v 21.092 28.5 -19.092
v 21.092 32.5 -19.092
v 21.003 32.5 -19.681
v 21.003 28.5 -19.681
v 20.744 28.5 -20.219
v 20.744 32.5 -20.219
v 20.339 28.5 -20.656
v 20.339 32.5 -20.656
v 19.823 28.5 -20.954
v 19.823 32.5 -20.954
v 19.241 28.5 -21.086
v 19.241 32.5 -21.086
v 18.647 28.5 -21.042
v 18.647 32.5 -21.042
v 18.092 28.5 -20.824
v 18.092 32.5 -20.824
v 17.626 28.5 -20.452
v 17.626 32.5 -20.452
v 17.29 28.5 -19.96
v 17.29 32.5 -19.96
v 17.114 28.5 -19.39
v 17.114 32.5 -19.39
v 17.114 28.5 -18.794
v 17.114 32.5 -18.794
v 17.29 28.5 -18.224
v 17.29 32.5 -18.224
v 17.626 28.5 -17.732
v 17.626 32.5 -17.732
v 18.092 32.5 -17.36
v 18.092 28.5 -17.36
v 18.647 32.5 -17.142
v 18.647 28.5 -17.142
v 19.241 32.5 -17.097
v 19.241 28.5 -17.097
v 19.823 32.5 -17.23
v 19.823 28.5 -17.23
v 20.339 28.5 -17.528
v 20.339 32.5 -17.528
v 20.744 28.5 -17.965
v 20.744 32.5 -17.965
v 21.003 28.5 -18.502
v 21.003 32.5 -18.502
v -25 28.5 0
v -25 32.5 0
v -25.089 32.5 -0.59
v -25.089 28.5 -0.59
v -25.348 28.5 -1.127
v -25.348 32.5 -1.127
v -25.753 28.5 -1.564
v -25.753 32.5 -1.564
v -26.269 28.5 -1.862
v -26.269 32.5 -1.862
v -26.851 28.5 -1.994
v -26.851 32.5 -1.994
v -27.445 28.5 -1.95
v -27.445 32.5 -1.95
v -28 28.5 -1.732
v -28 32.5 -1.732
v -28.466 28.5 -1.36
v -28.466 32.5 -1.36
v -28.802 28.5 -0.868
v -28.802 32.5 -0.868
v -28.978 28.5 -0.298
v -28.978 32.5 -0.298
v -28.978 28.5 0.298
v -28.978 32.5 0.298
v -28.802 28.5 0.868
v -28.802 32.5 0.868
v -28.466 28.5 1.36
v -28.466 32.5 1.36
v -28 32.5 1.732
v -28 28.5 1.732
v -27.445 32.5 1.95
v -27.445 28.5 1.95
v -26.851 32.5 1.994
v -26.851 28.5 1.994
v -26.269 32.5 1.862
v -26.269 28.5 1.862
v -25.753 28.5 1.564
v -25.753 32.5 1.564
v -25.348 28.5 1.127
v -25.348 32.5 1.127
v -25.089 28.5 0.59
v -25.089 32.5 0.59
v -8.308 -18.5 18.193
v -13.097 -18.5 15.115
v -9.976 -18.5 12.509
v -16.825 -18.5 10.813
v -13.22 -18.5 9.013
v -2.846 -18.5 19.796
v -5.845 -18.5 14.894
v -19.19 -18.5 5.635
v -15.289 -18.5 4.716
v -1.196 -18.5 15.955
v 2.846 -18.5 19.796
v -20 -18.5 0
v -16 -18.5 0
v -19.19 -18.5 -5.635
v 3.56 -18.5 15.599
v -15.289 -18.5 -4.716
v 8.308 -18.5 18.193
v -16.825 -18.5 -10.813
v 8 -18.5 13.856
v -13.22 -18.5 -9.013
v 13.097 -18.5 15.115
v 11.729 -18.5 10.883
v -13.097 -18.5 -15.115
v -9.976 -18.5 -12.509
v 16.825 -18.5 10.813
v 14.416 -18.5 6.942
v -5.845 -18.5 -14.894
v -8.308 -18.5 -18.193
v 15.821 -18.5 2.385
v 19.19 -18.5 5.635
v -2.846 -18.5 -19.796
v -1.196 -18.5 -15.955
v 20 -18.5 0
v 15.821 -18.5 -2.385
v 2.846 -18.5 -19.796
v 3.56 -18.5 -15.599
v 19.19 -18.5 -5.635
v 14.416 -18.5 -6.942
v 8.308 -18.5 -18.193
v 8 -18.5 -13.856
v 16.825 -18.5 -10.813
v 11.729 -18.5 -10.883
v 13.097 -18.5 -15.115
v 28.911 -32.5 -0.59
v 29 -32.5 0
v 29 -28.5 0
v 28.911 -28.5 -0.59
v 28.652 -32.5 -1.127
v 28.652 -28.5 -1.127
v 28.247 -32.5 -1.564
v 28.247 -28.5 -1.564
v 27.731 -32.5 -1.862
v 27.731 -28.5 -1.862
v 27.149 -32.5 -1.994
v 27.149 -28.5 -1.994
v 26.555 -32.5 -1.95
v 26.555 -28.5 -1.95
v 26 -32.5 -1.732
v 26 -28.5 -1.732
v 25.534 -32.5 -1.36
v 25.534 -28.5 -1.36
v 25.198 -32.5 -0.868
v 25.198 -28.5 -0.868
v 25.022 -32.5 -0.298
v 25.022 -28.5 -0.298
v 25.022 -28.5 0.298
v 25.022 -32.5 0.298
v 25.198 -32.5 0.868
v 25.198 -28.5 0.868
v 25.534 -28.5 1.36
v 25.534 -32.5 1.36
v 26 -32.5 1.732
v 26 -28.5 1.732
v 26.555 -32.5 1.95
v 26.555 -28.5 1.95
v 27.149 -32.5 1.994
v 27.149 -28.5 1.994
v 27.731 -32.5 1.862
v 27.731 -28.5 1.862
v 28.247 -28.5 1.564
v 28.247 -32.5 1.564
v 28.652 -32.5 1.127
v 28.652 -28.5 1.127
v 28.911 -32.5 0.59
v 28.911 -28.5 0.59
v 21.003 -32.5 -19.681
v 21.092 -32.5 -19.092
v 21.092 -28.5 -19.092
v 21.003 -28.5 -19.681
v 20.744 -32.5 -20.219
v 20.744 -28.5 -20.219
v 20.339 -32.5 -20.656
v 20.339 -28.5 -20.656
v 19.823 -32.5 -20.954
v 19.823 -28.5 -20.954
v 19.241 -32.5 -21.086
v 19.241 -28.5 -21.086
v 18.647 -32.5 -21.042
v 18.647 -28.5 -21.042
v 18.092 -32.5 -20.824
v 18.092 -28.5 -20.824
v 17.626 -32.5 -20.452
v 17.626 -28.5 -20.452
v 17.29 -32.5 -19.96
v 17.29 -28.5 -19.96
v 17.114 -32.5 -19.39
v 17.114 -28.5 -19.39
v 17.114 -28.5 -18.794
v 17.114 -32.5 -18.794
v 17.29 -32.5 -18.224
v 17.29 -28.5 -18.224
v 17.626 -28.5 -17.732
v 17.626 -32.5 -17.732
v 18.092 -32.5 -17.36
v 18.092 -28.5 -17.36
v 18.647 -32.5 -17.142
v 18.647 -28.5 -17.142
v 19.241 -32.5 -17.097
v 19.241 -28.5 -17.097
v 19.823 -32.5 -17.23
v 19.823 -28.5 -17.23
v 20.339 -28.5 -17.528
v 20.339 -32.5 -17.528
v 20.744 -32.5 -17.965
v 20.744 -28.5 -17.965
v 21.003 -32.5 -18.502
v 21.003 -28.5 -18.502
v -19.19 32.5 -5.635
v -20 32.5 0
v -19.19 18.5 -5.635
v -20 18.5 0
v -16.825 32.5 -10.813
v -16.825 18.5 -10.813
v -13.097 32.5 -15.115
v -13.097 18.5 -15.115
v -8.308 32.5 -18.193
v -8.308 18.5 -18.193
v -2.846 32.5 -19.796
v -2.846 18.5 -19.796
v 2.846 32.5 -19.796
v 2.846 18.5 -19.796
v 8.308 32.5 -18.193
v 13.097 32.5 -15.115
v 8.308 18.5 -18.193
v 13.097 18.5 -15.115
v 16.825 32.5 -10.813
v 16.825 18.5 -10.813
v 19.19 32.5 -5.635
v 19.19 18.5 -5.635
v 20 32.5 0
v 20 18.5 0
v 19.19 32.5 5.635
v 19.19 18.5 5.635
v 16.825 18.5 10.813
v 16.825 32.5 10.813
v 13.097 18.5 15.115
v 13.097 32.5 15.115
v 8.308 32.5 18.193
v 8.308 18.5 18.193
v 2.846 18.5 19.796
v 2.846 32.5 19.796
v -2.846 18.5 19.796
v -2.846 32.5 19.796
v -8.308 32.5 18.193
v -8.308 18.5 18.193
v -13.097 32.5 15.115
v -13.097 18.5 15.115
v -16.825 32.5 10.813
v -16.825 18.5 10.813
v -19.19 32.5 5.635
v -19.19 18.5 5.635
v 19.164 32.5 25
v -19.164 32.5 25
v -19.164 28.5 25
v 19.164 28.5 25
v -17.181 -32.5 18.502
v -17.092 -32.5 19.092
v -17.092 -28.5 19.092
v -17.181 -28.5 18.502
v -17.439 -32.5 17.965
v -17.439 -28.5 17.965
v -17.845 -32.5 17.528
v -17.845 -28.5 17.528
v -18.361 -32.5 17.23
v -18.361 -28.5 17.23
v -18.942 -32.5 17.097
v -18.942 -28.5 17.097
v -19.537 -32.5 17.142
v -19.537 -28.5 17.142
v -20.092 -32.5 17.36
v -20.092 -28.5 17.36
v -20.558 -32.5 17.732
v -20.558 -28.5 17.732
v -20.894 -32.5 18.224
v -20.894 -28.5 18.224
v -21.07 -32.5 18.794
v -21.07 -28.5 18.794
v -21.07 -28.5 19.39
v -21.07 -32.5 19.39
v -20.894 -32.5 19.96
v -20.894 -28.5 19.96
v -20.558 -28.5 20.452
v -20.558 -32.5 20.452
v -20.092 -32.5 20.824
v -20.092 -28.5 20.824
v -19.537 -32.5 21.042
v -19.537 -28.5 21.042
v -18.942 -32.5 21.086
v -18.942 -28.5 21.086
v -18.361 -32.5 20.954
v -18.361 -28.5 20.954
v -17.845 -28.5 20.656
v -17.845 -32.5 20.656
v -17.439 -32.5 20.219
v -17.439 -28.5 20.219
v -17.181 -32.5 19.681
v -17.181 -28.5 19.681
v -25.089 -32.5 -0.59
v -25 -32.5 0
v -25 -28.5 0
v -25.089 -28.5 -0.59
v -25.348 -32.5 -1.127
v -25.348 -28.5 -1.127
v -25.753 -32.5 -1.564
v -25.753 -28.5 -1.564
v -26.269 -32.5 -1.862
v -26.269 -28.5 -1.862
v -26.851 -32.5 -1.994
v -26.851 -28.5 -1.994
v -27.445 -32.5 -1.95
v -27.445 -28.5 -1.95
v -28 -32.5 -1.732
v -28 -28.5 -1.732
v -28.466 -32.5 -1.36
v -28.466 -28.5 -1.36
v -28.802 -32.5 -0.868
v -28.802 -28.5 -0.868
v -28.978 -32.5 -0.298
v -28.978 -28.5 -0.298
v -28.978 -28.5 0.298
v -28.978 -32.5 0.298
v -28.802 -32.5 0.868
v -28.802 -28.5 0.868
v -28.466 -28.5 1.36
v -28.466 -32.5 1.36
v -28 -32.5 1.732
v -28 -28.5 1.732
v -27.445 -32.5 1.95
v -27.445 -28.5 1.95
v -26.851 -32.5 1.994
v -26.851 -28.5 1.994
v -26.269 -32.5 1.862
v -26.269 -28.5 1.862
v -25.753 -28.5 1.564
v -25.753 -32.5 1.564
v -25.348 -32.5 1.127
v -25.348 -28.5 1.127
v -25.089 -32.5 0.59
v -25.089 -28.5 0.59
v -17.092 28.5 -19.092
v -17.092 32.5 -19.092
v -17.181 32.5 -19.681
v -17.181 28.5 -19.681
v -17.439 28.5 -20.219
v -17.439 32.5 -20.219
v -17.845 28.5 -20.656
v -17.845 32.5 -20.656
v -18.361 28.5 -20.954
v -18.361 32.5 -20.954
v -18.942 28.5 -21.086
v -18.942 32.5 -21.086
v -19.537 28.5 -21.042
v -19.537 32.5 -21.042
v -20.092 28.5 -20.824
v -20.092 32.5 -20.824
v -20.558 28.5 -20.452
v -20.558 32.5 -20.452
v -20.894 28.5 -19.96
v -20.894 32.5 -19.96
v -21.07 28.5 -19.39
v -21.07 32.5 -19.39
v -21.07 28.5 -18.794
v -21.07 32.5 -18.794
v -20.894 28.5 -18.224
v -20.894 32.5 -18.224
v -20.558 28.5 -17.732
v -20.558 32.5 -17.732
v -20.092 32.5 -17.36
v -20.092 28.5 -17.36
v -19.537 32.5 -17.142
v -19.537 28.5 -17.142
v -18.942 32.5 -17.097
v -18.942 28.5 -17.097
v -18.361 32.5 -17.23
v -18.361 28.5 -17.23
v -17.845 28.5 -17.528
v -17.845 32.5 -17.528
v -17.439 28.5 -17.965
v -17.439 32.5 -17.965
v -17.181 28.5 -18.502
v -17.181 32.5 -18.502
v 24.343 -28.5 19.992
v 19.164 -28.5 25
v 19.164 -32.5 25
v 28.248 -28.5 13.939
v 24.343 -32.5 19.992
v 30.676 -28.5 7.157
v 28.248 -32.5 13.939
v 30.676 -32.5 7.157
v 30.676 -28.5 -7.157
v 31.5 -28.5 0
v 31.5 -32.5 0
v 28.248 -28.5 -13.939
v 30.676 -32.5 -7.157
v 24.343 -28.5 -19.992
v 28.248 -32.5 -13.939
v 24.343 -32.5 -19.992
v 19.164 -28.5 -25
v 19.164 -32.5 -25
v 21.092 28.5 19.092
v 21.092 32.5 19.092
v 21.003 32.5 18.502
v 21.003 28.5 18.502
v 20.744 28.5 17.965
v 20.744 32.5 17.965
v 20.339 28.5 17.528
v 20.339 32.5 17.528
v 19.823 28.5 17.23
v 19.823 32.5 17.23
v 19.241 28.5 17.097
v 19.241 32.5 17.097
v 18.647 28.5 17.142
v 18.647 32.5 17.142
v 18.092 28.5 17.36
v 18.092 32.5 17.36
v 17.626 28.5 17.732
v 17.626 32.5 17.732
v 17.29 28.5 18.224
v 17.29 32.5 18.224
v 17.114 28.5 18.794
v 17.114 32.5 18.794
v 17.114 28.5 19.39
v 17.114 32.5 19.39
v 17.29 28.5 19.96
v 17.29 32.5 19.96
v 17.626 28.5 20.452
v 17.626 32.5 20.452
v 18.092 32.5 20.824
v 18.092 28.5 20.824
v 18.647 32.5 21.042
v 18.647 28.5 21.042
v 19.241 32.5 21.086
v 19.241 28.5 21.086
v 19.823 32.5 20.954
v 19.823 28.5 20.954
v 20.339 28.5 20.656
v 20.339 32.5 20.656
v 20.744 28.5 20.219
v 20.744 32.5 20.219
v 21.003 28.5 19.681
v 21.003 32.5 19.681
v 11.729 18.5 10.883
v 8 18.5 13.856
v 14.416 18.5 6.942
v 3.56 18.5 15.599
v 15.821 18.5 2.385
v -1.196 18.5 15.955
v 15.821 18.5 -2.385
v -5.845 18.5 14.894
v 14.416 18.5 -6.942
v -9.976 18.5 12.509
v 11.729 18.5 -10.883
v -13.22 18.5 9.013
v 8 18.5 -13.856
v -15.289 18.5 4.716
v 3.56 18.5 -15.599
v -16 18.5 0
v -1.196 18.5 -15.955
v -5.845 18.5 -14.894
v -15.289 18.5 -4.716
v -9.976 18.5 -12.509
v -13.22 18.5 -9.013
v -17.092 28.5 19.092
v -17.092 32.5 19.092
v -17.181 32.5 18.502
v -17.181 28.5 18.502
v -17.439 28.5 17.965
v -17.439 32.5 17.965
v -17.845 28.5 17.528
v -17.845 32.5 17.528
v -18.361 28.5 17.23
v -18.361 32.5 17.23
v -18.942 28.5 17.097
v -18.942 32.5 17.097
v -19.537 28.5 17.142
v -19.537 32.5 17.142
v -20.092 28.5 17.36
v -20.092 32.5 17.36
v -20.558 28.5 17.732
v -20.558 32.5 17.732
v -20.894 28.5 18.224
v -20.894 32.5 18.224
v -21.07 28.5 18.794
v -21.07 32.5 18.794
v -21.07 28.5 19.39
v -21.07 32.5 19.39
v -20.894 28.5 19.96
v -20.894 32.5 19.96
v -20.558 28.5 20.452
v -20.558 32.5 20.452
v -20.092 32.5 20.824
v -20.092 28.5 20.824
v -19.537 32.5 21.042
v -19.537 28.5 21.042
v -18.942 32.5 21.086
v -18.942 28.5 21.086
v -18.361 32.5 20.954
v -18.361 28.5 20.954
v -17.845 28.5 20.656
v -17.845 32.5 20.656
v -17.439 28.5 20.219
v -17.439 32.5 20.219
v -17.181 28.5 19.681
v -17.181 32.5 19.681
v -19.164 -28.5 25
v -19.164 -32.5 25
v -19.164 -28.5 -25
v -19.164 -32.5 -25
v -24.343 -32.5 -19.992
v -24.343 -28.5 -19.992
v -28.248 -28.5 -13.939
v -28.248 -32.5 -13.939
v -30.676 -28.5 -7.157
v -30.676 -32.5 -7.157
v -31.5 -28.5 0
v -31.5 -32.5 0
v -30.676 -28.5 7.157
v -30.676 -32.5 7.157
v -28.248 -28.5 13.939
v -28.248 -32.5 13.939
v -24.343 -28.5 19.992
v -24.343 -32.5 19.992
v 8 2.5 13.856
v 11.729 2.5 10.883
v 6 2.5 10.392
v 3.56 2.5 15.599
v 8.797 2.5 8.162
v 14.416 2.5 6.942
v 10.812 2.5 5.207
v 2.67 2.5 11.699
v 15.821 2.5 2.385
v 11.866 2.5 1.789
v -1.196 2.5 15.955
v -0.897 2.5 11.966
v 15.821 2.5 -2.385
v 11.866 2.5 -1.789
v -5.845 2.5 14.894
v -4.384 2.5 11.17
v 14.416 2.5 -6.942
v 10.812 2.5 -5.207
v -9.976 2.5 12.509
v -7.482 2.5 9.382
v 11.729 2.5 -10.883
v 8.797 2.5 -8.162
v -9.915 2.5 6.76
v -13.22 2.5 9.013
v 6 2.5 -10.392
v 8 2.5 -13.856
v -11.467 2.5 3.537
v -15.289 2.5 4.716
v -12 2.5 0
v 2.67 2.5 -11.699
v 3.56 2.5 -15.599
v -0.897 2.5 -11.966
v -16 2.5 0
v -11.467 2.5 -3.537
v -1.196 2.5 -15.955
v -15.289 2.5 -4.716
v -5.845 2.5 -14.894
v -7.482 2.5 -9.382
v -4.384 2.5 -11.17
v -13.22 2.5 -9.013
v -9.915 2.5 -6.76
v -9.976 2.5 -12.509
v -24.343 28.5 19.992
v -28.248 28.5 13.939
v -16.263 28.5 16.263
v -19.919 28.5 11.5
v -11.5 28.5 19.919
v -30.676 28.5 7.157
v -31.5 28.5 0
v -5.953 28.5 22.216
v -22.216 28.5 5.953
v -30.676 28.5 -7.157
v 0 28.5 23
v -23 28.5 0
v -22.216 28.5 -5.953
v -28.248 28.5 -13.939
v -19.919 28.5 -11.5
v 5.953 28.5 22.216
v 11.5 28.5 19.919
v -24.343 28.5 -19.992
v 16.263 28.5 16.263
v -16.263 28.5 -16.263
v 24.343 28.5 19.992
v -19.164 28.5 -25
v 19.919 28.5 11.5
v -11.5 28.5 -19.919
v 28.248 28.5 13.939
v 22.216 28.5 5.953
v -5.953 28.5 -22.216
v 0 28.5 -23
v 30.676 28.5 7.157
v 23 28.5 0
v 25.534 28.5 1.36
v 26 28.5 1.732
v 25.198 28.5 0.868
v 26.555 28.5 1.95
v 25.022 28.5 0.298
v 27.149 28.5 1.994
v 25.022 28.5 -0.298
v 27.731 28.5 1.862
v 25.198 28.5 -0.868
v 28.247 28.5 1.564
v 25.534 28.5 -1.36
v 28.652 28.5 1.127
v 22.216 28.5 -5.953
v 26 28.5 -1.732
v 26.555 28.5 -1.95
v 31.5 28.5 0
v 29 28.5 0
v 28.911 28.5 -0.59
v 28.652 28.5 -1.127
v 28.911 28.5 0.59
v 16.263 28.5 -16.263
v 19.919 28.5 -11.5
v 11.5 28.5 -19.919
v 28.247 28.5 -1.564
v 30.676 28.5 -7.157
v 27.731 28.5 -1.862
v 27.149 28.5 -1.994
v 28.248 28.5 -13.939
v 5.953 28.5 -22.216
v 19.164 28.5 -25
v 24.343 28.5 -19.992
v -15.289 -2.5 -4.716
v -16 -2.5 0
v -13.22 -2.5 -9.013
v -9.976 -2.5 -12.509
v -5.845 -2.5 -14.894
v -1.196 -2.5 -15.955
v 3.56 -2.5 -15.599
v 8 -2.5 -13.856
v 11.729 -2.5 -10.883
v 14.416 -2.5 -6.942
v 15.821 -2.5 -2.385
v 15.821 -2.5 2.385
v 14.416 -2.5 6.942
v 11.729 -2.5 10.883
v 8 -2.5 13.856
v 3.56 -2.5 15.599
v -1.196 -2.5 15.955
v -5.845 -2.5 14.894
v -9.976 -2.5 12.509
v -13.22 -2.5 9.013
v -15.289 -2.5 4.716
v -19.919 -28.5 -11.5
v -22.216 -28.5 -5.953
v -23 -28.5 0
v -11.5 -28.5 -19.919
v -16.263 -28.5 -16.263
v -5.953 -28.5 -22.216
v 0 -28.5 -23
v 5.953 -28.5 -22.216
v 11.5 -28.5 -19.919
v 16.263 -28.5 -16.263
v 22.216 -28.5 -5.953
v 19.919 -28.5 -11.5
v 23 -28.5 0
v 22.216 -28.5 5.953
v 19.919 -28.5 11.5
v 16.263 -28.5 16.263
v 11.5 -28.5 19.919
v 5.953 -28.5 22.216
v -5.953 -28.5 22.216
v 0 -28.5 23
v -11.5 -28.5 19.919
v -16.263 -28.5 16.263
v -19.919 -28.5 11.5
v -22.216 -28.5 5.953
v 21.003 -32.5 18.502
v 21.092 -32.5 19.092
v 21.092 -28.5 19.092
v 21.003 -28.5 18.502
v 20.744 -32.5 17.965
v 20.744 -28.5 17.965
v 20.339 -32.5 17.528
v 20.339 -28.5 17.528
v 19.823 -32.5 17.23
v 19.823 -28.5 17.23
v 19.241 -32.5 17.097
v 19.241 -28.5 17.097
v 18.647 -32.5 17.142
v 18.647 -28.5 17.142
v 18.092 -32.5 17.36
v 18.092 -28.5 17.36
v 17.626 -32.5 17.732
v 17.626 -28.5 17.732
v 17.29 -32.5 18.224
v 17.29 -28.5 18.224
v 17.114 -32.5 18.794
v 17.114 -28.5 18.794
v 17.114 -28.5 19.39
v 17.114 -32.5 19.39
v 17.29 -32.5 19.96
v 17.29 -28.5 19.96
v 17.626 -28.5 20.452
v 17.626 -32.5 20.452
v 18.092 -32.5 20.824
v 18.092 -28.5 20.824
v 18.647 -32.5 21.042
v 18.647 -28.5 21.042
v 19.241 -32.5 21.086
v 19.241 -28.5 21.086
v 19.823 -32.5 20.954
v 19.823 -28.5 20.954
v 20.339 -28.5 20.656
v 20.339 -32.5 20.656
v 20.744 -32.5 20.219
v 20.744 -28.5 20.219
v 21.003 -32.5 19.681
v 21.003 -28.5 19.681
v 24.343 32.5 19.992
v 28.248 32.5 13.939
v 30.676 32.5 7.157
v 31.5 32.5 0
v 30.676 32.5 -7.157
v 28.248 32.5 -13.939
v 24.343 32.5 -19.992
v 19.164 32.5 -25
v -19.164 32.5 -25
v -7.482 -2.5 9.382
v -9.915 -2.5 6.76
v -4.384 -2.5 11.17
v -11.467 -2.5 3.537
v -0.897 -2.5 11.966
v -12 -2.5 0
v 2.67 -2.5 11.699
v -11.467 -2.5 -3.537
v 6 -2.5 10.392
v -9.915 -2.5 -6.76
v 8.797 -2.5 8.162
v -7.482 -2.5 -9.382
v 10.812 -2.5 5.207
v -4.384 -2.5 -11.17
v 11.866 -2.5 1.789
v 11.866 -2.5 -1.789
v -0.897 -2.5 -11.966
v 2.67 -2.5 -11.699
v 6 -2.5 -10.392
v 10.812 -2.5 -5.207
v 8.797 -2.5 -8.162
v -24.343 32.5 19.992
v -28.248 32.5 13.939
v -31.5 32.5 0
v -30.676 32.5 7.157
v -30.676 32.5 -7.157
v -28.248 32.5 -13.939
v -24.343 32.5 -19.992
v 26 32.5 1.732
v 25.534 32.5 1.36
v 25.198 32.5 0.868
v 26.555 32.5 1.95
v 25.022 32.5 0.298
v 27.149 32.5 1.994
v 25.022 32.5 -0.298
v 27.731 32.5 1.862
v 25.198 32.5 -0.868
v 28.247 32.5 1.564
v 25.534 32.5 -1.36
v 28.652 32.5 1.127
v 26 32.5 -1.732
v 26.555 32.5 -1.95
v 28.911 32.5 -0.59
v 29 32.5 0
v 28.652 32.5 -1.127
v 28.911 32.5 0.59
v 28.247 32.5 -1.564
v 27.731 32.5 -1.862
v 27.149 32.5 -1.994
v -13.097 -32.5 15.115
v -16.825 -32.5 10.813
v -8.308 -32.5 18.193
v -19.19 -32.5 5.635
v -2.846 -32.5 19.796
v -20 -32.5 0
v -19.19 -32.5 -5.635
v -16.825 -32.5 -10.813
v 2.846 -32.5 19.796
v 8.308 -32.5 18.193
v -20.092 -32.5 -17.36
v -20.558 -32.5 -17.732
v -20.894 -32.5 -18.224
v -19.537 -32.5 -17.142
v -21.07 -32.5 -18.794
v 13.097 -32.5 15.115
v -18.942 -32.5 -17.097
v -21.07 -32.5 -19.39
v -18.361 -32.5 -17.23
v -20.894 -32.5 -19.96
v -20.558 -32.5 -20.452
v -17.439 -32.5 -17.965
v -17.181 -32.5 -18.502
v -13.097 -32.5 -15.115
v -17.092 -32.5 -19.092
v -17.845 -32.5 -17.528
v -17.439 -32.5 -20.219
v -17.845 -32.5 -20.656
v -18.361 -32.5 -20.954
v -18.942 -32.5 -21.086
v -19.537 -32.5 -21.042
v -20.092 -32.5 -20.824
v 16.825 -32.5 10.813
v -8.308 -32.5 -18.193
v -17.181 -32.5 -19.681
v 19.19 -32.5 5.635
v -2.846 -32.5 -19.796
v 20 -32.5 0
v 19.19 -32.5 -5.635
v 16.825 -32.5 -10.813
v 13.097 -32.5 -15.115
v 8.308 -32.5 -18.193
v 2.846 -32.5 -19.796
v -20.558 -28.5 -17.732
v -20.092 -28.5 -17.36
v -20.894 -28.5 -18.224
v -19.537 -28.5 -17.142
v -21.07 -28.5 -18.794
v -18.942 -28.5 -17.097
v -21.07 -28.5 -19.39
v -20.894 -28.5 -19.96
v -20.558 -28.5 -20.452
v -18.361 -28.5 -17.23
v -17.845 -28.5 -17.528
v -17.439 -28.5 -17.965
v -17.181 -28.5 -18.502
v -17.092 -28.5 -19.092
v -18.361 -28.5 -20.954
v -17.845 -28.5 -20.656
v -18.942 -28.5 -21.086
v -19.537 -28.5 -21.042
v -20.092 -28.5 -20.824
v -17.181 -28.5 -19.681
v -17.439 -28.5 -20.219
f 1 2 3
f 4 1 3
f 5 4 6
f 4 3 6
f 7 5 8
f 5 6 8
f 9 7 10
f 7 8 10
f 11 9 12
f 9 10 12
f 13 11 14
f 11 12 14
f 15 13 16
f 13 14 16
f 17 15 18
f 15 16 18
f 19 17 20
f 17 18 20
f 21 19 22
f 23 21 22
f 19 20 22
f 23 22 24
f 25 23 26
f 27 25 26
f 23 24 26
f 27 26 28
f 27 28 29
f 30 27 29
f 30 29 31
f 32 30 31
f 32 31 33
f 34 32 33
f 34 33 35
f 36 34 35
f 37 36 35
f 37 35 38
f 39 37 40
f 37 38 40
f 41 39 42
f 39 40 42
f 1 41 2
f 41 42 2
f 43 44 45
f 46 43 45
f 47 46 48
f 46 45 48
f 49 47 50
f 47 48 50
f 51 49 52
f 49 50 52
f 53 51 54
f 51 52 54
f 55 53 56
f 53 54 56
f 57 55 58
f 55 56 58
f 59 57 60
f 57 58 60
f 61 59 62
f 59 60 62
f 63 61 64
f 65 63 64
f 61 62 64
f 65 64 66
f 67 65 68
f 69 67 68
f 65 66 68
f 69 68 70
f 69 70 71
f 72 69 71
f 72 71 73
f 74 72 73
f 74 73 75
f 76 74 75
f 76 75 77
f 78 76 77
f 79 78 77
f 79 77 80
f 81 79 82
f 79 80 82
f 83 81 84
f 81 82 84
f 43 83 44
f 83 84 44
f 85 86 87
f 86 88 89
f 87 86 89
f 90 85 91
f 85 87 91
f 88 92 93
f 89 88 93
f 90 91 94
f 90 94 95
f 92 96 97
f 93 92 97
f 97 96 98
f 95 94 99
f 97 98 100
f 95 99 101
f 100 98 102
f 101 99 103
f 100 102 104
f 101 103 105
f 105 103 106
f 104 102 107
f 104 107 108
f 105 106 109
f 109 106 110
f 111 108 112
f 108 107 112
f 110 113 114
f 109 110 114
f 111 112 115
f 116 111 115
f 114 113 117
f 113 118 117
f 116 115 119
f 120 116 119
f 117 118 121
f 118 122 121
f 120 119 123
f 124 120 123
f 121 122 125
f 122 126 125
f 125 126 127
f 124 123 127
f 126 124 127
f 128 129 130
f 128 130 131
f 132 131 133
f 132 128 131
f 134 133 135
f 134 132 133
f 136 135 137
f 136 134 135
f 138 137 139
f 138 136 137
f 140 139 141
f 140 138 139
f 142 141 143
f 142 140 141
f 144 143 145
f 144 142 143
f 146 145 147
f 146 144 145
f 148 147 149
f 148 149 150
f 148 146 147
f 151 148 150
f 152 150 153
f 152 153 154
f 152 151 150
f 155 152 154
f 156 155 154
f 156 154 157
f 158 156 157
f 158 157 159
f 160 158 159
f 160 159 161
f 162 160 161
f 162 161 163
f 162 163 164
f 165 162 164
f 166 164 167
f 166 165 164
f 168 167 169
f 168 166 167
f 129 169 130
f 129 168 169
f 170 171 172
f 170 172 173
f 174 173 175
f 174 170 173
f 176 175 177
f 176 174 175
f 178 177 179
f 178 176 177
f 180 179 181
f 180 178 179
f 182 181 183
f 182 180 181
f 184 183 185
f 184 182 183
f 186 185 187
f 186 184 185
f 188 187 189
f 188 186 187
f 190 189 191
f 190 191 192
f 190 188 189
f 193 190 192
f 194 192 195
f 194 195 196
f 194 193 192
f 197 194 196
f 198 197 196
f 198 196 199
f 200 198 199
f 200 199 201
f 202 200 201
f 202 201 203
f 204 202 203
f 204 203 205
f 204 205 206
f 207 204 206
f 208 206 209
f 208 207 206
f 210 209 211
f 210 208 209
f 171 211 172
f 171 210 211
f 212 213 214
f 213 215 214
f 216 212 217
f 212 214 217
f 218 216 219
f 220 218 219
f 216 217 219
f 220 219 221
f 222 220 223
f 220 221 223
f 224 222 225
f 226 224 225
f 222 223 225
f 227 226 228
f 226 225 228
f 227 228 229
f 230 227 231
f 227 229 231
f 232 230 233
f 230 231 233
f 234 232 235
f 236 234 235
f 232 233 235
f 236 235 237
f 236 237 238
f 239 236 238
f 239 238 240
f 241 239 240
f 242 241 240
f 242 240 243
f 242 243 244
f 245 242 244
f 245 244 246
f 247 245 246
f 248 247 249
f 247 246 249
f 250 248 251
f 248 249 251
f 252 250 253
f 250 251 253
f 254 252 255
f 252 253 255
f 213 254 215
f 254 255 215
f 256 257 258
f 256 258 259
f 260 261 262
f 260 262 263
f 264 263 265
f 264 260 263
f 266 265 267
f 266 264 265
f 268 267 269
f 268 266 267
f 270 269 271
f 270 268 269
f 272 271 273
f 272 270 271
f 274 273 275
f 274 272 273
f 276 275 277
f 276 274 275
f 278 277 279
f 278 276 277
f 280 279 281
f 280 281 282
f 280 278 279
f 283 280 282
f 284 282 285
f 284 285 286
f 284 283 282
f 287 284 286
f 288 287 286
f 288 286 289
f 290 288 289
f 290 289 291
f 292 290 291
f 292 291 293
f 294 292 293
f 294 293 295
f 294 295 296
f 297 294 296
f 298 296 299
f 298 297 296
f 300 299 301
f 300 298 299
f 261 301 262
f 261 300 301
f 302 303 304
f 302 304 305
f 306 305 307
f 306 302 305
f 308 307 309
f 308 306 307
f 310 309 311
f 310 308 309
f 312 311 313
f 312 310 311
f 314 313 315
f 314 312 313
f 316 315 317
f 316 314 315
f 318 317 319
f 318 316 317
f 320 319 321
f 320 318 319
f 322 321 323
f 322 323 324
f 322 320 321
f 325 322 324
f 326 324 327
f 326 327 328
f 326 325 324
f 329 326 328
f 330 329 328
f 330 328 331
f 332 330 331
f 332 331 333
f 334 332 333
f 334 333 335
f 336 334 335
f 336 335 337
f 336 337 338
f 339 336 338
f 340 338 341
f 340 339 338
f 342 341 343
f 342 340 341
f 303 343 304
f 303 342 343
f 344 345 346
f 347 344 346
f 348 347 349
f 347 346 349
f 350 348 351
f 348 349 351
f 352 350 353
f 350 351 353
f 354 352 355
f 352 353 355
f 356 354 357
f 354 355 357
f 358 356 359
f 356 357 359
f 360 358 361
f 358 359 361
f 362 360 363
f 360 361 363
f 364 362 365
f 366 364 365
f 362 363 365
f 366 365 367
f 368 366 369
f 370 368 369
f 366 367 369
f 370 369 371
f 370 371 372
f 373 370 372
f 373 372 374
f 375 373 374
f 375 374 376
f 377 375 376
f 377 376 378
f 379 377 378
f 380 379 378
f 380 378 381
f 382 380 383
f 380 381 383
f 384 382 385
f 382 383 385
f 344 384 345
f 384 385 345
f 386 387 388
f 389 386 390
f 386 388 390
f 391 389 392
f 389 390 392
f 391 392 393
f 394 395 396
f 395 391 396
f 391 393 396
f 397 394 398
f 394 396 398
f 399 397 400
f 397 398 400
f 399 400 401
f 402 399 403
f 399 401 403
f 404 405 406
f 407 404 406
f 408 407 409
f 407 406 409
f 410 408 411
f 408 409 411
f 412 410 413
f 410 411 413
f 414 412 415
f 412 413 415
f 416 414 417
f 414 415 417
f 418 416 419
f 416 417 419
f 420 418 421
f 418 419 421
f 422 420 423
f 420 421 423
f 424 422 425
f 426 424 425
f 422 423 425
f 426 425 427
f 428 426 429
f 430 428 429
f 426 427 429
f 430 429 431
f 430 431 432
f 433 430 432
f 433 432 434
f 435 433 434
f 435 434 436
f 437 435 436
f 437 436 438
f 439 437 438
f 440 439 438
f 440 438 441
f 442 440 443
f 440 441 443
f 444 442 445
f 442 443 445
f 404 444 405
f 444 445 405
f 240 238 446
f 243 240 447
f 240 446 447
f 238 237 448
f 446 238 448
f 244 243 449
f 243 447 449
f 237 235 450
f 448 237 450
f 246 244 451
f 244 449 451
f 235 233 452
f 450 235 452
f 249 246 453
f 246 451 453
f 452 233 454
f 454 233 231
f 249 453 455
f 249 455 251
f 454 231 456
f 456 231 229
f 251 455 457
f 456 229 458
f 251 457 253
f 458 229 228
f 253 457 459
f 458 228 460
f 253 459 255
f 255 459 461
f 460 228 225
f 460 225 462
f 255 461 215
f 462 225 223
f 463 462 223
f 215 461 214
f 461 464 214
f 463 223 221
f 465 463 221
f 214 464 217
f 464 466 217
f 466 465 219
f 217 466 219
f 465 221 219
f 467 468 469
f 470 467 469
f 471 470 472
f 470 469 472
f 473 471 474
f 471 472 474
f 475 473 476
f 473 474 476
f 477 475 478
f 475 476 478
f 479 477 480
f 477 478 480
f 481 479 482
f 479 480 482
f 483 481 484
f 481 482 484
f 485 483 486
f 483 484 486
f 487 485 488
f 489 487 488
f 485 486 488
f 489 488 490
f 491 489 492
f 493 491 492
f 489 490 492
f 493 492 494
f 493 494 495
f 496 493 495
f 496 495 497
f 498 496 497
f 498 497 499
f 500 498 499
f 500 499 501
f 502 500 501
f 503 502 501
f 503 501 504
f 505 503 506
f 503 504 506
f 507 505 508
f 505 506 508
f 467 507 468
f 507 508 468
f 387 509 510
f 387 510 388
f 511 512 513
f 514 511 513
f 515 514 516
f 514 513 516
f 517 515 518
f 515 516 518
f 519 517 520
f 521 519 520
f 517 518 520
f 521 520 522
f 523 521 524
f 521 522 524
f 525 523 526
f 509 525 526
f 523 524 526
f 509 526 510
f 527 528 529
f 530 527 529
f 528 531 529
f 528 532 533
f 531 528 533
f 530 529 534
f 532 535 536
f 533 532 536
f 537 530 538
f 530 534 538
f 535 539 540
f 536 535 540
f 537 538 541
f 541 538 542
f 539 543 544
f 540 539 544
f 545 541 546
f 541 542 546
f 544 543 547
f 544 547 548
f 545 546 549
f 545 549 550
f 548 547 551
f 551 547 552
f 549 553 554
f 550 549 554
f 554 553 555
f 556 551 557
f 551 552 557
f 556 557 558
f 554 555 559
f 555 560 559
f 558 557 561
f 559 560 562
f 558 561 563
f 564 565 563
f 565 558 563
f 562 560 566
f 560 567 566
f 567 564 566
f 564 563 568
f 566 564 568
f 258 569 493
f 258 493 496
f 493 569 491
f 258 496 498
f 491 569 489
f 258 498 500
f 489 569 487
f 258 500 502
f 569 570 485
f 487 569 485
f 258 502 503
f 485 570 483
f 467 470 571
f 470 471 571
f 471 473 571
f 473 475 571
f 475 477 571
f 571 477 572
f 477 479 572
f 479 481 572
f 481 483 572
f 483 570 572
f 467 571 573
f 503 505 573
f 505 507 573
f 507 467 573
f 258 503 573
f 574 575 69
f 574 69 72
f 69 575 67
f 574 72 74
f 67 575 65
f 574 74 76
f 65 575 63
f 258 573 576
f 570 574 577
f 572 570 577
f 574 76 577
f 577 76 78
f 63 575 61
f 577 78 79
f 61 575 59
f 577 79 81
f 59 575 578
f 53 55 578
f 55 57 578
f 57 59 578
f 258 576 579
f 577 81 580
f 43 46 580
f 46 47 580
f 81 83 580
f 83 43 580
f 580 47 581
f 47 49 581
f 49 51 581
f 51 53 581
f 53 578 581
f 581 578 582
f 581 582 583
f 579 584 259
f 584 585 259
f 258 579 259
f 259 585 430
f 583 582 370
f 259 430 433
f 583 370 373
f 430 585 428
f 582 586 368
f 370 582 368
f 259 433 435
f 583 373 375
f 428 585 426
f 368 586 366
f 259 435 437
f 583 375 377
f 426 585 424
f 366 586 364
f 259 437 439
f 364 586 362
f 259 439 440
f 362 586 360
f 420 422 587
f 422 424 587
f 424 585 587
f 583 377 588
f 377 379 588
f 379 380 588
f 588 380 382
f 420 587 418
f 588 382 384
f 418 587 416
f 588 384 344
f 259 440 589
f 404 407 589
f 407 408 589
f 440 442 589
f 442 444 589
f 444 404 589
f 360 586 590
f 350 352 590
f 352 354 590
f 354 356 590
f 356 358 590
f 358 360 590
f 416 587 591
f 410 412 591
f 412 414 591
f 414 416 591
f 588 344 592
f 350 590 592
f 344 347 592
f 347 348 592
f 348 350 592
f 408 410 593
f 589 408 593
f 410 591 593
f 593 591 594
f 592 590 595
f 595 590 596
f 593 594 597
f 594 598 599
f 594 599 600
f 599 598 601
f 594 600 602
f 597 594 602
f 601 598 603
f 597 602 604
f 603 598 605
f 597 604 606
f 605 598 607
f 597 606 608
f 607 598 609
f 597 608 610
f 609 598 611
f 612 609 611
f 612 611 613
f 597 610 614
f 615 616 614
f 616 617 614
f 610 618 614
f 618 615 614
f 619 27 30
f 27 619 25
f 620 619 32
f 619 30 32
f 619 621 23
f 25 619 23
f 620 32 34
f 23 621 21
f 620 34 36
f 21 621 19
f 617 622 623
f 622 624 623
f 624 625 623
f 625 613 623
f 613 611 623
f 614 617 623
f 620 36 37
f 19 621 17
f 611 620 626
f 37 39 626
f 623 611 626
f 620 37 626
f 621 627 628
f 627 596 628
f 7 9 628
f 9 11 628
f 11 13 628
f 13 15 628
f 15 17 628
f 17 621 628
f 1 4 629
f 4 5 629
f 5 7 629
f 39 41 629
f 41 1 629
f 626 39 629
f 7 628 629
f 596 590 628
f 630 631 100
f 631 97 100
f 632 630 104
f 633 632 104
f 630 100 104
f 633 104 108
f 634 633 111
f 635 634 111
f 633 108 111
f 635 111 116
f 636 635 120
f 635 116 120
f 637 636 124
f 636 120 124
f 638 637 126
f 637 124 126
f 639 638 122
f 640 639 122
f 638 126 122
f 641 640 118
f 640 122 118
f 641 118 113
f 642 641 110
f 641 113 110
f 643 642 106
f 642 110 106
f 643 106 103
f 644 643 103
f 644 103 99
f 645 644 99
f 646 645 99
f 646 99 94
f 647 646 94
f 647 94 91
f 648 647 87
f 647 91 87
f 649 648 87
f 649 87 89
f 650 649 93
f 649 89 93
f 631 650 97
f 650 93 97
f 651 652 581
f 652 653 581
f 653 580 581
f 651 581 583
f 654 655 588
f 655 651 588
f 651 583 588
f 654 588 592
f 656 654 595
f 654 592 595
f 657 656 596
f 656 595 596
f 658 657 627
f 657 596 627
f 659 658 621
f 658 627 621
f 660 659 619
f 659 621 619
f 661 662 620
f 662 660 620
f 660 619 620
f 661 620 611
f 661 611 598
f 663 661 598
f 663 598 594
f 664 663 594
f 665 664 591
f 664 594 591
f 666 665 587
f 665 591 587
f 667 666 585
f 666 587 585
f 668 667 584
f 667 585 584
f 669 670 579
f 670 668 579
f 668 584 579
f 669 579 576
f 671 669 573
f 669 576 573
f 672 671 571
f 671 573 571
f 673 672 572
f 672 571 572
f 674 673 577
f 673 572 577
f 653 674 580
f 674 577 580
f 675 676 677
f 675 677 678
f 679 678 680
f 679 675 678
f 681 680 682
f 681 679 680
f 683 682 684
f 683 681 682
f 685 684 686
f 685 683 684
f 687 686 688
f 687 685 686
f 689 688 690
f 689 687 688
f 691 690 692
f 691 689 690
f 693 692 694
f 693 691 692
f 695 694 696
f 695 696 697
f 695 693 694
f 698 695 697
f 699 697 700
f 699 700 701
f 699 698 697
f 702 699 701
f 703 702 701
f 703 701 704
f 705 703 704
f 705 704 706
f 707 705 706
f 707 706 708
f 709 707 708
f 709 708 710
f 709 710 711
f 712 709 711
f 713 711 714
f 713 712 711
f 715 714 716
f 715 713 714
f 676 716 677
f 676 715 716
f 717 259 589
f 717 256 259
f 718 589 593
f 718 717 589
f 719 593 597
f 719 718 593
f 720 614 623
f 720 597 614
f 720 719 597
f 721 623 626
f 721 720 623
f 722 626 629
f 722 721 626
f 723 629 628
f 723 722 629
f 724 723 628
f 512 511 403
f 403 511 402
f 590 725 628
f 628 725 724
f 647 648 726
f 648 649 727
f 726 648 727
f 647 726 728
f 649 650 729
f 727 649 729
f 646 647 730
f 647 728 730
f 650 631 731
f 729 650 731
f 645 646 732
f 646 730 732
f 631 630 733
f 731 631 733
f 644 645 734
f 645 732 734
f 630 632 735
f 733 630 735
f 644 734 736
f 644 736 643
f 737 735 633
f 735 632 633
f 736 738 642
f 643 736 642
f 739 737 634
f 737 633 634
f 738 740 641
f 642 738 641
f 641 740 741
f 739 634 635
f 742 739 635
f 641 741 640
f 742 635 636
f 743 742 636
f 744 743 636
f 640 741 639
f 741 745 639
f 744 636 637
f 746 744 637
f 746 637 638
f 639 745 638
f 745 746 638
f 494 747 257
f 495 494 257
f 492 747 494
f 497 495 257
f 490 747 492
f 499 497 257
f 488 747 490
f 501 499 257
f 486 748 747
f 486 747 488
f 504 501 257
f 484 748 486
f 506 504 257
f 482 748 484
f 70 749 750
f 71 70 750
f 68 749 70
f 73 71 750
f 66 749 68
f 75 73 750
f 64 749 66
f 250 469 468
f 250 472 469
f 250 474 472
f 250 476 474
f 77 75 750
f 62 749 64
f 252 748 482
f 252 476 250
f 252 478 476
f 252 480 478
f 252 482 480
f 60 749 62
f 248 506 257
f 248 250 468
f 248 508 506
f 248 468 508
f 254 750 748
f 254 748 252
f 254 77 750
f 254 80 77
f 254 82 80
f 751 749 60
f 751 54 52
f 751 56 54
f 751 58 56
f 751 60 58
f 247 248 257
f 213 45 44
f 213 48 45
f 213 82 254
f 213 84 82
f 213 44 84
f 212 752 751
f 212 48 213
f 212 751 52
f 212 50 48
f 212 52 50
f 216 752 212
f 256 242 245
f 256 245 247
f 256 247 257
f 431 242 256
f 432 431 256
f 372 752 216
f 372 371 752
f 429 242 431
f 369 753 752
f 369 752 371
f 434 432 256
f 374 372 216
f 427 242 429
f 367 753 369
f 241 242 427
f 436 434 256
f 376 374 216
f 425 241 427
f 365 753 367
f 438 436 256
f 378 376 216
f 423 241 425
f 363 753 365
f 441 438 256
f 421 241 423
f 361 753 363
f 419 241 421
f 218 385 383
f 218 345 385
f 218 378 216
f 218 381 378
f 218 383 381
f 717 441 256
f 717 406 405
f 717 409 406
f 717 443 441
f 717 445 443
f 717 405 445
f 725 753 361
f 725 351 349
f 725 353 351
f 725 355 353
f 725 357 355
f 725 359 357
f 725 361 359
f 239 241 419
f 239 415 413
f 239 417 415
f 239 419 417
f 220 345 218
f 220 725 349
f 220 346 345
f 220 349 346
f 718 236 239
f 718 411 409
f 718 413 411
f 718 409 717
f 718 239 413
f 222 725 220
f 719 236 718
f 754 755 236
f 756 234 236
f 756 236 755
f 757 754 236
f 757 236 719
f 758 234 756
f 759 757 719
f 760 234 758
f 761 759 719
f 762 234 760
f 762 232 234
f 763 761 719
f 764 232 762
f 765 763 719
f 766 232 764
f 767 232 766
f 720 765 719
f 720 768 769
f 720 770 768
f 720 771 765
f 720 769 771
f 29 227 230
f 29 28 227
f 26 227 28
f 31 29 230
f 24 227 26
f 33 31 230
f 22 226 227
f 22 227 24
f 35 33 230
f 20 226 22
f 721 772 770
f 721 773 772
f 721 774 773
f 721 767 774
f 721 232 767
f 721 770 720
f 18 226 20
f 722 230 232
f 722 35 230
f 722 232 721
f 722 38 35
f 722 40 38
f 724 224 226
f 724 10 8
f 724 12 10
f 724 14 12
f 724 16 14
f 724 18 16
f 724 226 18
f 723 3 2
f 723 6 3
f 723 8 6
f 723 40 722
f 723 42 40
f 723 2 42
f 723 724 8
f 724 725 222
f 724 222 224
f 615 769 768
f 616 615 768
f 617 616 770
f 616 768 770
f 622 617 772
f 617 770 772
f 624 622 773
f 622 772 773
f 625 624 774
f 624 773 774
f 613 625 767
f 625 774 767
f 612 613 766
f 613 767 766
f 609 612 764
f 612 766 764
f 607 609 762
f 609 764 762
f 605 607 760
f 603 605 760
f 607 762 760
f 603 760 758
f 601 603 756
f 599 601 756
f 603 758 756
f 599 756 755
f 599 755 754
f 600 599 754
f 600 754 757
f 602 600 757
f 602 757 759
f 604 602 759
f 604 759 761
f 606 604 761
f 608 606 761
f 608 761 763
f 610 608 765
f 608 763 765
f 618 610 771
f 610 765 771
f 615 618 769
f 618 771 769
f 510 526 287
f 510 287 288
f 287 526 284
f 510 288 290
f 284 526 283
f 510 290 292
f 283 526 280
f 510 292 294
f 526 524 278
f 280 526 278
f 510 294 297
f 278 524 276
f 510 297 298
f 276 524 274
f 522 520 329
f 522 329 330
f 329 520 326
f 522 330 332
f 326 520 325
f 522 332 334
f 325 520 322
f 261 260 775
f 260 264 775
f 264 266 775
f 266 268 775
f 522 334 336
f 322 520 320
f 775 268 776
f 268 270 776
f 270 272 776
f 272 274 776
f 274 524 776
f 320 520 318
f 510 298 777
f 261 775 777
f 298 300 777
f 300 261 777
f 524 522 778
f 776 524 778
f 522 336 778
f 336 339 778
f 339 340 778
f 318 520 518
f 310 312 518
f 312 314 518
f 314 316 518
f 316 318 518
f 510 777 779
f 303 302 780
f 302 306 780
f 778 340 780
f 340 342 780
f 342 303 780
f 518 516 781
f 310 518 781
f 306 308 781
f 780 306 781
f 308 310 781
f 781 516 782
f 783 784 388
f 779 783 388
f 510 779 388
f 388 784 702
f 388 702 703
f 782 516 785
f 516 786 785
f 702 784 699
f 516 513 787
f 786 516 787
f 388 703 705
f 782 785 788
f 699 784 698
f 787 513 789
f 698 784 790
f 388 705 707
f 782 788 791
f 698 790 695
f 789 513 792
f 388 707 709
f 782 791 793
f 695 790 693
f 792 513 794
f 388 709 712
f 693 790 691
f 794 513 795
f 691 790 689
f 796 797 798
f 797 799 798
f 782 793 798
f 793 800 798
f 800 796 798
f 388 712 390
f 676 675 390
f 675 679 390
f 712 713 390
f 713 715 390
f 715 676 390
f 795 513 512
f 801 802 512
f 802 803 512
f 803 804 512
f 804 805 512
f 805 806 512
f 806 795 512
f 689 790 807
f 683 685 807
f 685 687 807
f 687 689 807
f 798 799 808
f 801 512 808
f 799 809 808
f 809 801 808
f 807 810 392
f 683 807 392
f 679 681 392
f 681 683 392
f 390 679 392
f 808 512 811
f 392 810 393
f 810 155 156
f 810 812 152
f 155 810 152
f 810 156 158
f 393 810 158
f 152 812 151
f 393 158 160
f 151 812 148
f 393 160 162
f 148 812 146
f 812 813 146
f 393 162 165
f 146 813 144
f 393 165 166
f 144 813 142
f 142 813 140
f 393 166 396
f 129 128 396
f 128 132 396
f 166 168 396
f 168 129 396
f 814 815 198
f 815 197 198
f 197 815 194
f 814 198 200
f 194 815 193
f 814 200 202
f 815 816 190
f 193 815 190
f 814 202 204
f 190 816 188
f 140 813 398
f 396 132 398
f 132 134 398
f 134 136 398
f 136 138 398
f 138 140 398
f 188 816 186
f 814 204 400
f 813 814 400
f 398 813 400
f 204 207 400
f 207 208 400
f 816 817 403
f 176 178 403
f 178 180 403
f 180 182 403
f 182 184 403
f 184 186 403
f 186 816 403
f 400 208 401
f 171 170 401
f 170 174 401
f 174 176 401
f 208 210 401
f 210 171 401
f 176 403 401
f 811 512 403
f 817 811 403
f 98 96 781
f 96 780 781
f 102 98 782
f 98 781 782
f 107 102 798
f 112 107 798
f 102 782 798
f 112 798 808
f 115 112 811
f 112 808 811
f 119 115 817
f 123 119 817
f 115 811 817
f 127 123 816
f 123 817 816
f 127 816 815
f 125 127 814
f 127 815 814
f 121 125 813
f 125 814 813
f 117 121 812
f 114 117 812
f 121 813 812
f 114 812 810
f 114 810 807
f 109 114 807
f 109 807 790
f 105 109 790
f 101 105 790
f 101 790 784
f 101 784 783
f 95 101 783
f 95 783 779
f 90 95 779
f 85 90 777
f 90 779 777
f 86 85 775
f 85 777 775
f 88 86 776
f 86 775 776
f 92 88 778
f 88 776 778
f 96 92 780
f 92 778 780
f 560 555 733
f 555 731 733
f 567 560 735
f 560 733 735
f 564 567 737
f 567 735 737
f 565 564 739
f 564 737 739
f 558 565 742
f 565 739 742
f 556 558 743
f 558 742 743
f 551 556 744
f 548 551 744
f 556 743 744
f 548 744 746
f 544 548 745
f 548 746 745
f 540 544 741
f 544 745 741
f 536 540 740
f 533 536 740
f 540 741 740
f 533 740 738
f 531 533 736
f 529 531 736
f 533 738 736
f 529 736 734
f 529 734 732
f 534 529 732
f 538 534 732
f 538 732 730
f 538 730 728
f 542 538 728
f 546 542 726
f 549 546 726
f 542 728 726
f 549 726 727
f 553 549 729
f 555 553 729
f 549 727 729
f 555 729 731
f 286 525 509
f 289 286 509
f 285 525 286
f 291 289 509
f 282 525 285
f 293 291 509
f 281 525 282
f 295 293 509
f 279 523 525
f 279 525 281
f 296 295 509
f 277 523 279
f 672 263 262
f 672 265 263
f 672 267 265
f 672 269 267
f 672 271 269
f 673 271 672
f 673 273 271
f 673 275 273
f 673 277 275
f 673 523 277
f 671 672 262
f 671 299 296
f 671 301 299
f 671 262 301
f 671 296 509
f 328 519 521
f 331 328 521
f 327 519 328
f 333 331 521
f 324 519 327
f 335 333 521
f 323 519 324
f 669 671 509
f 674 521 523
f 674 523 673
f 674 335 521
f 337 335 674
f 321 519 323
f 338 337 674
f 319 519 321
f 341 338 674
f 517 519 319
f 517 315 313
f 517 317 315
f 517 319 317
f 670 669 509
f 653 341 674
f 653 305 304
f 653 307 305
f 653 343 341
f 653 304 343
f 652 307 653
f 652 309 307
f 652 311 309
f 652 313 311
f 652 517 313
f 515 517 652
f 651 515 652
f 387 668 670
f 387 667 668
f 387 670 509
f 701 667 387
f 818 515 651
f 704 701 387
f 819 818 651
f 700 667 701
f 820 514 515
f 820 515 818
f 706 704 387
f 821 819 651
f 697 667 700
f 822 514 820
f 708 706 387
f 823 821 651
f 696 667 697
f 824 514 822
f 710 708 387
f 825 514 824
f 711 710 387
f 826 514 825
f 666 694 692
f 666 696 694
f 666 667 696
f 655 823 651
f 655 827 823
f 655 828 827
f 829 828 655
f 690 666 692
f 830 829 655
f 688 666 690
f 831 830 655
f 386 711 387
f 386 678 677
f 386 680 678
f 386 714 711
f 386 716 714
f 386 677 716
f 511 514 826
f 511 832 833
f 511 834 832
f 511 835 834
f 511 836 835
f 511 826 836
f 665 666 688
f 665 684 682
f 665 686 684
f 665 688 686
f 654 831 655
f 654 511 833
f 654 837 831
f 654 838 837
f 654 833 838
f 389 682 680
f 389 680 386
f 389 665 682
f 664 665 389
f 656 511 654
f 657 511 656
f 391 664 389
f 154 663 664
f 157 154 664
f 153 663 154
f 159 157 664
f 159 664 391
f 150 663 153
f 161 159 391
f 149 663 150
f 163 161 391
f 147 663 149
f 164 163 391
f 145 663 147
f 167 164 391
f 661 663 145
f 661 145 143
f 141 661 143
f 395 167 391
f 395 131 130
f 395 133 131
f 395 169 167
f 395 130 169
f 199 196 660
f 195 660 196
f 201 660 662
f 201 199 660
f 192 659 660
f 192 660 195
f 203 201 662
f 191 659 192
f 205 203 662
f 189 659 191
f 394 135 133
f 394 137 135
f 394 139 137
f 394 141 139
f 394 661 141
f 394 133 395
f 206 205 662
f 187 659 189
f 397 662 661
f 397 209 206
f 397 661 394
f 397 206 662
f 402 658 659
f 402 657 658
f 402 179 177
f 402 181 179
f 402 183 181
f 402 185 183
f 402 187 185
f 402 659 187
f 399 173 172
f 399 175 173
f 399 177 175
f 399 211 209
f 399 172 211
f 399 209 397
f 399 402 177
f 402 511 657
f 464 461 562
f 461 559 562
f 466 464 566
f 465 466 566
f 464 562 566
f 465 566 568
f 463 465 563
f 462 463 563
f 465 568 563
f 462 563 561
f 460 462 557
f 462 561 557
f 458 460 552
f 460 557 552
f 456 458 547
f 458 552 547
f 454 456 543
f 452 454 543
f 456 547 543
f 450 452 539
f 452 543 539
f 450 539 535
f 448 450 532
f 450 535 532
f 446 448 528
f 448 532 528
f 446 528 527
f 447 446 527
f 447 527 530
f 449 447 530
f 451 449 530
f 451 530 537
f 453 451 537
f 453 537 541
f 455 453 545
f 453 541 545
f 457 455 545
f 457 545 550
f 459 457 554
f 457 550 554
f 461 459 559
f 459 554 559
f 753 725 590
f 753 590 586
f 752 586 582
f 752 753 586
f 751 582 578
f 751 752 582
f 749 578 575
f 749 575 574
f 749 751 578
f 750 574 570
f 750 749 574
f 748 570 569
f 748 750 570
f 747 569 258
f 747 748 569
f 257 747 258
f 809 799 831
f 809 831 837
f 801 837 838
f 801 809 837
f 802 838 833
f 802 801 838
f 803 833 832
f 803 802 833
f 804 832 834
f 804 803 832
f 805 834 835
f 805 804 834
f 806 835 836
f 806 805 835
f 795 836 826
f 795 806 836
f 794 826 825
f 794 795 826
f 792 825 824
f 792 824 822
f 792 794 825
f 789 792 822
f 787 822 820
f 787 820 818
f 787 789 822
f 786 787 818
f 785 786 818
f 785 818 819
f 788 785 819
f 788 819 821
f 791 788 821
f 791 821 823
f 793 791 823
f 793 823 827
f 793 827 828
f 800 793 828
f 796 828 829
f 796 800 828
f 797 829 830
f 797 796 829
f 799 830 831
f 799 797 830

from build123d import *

# Parameters (mm, degrees)
SKETCH4_R           = 31.5
SKETCH4_R_2         = 21.5
SKETCH4_R_3         = 2
BOSS_EXTRUDE1_DEPTH = 4
SKETCH5_W           = 97.16267939
SKETCH5_H           = 14.406328081
SKETCH5_H_2         = 19.608613221
CUT_EXTRUDE1_DEPTH  = 66


with BuildPart() as part:
    # Sketch1 → Revolve1 (revolve)
    with BuildSketch(Plane.XY):
        Polygon((-12, 2.5), (-12, -2.5), (-16, -2.5), (-16, -18.5), (-20, -18.5), (-20, -32.5), (-23, -32.5), (-23, 32.5), (-20, 32.5), (-20, 18.5), (-16, 18.5), (-16, 2.5), align=None)
    revolve(axis=Axis((0, 75.096781517, 0), (0, -1, 0)))

    # Sketch4 → Boss-Extrude1 (add)
    with BuildSketch(Plane(origin=(0, 32.5, 0), x_dir=(1, 0, 0), z_dir=(0, 1, 0))):
        Circle(SKETCH4_R)
        Circle(SKETCH4_R_2, mode=Mode.SUBTRACT)
        with Locations((0, 27)):
            Circle(SKETCH4_R_3, mode=Mode.SUBTRACT)
        with Locations((19.091883092, 19.091883092)):
            Circle(SKETCH4_R_3, mode=Mode.SUBTRACT)
        with Locations((27, 0)):
            Circle(SKETCH4_R_3, mode=Mode.SUBTRACT)
        with Locations((19.091883092, -19.091883092)):
            Circle(SKETCH4_R_3, mode=Mode.SUBTRACT)
        with Locations((0, -27)):
            Circle(SKETCH4_R_3, mode=Mode.SUBTRACT)
        with Locations((-19.091883092, -19.091883092)):
            Circle(SKETCH4_R_3, mode=Mode.SUBTRACT)
        with Locations((-27, 0)):
            Circle(SKETCH4_R_3, mode=Mode.SUBTRACT)
        with Locations((-19.091883092, 19.091883092)):
            Circle(SKETCH4_R_3, mode=Mode.SUBTRACT)
    boss_extrude1 = extrude(amount=-BOSS_EXTRUDE1_DEPTH)

    # Mirror1: Boss-Extrude1 across plane
    add(boss_extrude1.mirror(Plane.ZX))

    # Sketch5 → Cut-Extrude1 (cut, through all)
    with BuildSketch(Plane(origin=(0, 32.5, 0), x_dir=(1, 0, 0), z_dir=(0, 1, 0))):
        with Locations((4.630564128, 32.20316404)):
            Rectangle(SKETCH5_W, SKETCH5_H)
        with Locations((4.630564128, -34.804306611)):
            Rectangle(SKETCH5_W, SKETCH5_H_2)
    extrude(amount=-CUT_EXTRUDE1_DEPTH, mode=Mode.SUBTRACT)


solid = part.part
